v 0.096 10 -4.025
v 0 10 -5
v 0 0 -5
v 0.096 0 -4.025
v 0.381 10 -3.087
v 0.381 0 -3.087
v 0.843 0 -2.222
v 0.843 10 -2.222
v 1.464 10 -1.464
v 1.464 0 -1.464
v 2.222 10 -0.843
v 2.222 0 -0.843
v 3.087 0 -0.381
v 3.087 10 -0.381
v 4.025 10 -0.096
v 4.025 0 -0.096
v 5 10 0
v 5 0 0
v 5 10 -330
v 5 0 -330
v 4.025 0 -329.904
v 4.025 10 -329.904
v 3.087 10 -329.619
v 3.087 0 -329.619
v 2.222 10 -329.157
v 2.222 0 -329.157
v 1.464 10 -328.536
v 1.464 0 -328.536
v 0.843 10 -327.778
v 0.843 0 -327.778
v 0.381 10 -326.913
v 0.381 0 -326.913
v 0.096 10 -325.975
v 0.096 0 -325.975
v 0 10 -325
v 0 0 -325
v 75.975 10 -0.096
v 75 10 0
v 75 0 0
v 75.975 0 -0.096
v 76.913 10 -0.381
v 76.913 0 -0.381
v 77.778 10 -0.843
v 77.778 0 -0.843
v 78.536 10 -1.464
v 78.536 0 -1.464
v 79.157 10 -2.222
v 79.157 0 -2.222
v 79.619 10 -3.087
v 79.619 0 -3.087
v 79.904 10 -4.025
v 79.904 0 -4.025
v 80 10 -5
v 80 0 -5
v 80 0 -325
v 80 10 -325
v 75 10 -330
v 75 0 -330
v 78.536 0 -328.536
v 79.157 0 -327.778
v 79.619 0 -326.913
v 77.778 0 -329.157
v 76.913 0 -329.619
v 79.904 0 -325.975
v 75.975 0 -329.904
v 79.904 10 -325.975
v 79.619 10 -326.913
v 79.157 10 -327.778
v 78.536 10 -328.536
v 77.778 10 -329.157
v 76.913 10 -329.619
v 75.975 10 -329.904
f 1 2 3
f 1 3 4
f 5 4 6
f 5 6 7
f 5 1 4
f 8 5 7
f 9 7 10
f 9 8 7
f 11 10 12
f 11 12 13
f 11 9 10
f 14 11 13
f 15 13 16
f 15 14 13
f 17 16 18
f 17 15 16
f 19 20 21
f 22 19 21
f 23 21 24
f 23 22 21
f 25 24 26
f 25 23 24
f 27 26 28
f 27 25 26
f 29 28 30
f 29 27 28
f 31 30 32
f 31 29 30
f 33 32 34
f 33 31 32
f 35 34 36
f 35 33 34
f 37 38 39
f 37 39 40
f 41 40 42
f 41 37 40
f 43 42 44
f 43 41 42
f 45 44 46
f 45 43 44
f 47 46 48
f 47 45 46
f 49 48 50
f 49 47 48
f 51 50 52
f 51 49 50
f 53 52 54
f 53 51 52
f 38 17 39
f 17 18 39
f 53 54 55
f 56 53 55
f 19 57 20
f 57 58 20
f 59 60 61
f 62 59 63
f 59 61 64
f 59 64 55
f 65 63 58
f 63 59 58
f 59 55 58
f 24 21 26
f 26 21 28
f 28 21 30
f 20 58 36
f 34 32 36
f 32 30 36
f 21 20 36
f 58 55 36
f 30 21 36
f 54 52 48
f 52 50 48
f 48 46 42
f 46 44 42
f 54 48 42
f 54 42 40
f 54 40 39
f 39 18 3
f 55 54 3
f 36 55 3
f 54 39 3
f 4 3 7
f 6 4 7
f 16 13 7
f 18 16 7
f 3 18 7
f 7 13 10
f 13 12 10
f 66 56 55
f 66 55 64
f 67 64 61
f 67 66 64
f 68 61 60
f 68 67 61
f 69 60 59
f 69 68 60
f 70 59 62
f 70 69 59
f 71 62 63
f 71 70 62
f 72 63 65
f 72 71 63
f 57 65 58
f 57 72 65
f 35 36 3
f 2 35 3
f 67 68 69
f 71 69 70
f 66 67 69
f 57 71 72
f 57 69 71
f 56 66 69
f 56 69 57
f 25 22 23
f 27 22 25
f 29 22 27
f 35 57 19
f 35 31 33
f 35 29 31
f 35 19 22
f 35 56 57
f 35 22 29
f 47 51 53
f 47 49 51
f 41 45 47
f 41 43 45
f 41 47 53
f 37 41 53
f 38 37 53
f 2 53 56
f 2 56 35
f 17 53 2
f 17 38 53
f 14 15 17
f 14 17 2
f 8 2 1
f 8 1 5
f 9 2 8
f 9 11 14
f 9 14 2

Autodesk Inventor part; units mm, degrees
ref_plane "YZ Plane" through (0, 0, 0) normal (1, 0, 0) x (0, 1, 0)
ref_plane "XZ Plane" through (0, 0, 0) normal (0, 1, 0) x (-1, 0, 0)
ref_plane "XY Plane" through (0, 0, 0) normal (0, 0, 1) x (1, 0, 0)
sketch "Sketch2" plane through (0, 0, 0) normal (0, 1, 0) x (-1, 0, 0)
  line L0 (0, 0) -> (-80, 0)
  line L1 (-80, 0) -> (-80, -330)
  line L2 (-80, -330) -> (0, -330)
  line L3 (0, -330) -> (0, 0)
  dimension "d5" = 80
  dimension "d6" = 330
extrude "Extrusion2" add sketch "Sketch2" along normal blind 10
fillet "Fillet2" radius 5 4 edges at (0, 5, 0) (80, 5, 0) (0, 5, -330) (80, 5, -330)
sketch "Sketch1" plane through (0, 0, 0) normal (0, 1, 0) x (-1, 0, 0)
  line L0 (0, 0) -> (-260, 0)
  line L1 (-260, 0) -> (-260, -70)
  line L2 (-260, -70) -> (0, -70)
  line L3 (0, -70) -> (0, 0)
  dimension "d0" = 260
  dimension "d1" = 70
properties part number "wood part 1"
